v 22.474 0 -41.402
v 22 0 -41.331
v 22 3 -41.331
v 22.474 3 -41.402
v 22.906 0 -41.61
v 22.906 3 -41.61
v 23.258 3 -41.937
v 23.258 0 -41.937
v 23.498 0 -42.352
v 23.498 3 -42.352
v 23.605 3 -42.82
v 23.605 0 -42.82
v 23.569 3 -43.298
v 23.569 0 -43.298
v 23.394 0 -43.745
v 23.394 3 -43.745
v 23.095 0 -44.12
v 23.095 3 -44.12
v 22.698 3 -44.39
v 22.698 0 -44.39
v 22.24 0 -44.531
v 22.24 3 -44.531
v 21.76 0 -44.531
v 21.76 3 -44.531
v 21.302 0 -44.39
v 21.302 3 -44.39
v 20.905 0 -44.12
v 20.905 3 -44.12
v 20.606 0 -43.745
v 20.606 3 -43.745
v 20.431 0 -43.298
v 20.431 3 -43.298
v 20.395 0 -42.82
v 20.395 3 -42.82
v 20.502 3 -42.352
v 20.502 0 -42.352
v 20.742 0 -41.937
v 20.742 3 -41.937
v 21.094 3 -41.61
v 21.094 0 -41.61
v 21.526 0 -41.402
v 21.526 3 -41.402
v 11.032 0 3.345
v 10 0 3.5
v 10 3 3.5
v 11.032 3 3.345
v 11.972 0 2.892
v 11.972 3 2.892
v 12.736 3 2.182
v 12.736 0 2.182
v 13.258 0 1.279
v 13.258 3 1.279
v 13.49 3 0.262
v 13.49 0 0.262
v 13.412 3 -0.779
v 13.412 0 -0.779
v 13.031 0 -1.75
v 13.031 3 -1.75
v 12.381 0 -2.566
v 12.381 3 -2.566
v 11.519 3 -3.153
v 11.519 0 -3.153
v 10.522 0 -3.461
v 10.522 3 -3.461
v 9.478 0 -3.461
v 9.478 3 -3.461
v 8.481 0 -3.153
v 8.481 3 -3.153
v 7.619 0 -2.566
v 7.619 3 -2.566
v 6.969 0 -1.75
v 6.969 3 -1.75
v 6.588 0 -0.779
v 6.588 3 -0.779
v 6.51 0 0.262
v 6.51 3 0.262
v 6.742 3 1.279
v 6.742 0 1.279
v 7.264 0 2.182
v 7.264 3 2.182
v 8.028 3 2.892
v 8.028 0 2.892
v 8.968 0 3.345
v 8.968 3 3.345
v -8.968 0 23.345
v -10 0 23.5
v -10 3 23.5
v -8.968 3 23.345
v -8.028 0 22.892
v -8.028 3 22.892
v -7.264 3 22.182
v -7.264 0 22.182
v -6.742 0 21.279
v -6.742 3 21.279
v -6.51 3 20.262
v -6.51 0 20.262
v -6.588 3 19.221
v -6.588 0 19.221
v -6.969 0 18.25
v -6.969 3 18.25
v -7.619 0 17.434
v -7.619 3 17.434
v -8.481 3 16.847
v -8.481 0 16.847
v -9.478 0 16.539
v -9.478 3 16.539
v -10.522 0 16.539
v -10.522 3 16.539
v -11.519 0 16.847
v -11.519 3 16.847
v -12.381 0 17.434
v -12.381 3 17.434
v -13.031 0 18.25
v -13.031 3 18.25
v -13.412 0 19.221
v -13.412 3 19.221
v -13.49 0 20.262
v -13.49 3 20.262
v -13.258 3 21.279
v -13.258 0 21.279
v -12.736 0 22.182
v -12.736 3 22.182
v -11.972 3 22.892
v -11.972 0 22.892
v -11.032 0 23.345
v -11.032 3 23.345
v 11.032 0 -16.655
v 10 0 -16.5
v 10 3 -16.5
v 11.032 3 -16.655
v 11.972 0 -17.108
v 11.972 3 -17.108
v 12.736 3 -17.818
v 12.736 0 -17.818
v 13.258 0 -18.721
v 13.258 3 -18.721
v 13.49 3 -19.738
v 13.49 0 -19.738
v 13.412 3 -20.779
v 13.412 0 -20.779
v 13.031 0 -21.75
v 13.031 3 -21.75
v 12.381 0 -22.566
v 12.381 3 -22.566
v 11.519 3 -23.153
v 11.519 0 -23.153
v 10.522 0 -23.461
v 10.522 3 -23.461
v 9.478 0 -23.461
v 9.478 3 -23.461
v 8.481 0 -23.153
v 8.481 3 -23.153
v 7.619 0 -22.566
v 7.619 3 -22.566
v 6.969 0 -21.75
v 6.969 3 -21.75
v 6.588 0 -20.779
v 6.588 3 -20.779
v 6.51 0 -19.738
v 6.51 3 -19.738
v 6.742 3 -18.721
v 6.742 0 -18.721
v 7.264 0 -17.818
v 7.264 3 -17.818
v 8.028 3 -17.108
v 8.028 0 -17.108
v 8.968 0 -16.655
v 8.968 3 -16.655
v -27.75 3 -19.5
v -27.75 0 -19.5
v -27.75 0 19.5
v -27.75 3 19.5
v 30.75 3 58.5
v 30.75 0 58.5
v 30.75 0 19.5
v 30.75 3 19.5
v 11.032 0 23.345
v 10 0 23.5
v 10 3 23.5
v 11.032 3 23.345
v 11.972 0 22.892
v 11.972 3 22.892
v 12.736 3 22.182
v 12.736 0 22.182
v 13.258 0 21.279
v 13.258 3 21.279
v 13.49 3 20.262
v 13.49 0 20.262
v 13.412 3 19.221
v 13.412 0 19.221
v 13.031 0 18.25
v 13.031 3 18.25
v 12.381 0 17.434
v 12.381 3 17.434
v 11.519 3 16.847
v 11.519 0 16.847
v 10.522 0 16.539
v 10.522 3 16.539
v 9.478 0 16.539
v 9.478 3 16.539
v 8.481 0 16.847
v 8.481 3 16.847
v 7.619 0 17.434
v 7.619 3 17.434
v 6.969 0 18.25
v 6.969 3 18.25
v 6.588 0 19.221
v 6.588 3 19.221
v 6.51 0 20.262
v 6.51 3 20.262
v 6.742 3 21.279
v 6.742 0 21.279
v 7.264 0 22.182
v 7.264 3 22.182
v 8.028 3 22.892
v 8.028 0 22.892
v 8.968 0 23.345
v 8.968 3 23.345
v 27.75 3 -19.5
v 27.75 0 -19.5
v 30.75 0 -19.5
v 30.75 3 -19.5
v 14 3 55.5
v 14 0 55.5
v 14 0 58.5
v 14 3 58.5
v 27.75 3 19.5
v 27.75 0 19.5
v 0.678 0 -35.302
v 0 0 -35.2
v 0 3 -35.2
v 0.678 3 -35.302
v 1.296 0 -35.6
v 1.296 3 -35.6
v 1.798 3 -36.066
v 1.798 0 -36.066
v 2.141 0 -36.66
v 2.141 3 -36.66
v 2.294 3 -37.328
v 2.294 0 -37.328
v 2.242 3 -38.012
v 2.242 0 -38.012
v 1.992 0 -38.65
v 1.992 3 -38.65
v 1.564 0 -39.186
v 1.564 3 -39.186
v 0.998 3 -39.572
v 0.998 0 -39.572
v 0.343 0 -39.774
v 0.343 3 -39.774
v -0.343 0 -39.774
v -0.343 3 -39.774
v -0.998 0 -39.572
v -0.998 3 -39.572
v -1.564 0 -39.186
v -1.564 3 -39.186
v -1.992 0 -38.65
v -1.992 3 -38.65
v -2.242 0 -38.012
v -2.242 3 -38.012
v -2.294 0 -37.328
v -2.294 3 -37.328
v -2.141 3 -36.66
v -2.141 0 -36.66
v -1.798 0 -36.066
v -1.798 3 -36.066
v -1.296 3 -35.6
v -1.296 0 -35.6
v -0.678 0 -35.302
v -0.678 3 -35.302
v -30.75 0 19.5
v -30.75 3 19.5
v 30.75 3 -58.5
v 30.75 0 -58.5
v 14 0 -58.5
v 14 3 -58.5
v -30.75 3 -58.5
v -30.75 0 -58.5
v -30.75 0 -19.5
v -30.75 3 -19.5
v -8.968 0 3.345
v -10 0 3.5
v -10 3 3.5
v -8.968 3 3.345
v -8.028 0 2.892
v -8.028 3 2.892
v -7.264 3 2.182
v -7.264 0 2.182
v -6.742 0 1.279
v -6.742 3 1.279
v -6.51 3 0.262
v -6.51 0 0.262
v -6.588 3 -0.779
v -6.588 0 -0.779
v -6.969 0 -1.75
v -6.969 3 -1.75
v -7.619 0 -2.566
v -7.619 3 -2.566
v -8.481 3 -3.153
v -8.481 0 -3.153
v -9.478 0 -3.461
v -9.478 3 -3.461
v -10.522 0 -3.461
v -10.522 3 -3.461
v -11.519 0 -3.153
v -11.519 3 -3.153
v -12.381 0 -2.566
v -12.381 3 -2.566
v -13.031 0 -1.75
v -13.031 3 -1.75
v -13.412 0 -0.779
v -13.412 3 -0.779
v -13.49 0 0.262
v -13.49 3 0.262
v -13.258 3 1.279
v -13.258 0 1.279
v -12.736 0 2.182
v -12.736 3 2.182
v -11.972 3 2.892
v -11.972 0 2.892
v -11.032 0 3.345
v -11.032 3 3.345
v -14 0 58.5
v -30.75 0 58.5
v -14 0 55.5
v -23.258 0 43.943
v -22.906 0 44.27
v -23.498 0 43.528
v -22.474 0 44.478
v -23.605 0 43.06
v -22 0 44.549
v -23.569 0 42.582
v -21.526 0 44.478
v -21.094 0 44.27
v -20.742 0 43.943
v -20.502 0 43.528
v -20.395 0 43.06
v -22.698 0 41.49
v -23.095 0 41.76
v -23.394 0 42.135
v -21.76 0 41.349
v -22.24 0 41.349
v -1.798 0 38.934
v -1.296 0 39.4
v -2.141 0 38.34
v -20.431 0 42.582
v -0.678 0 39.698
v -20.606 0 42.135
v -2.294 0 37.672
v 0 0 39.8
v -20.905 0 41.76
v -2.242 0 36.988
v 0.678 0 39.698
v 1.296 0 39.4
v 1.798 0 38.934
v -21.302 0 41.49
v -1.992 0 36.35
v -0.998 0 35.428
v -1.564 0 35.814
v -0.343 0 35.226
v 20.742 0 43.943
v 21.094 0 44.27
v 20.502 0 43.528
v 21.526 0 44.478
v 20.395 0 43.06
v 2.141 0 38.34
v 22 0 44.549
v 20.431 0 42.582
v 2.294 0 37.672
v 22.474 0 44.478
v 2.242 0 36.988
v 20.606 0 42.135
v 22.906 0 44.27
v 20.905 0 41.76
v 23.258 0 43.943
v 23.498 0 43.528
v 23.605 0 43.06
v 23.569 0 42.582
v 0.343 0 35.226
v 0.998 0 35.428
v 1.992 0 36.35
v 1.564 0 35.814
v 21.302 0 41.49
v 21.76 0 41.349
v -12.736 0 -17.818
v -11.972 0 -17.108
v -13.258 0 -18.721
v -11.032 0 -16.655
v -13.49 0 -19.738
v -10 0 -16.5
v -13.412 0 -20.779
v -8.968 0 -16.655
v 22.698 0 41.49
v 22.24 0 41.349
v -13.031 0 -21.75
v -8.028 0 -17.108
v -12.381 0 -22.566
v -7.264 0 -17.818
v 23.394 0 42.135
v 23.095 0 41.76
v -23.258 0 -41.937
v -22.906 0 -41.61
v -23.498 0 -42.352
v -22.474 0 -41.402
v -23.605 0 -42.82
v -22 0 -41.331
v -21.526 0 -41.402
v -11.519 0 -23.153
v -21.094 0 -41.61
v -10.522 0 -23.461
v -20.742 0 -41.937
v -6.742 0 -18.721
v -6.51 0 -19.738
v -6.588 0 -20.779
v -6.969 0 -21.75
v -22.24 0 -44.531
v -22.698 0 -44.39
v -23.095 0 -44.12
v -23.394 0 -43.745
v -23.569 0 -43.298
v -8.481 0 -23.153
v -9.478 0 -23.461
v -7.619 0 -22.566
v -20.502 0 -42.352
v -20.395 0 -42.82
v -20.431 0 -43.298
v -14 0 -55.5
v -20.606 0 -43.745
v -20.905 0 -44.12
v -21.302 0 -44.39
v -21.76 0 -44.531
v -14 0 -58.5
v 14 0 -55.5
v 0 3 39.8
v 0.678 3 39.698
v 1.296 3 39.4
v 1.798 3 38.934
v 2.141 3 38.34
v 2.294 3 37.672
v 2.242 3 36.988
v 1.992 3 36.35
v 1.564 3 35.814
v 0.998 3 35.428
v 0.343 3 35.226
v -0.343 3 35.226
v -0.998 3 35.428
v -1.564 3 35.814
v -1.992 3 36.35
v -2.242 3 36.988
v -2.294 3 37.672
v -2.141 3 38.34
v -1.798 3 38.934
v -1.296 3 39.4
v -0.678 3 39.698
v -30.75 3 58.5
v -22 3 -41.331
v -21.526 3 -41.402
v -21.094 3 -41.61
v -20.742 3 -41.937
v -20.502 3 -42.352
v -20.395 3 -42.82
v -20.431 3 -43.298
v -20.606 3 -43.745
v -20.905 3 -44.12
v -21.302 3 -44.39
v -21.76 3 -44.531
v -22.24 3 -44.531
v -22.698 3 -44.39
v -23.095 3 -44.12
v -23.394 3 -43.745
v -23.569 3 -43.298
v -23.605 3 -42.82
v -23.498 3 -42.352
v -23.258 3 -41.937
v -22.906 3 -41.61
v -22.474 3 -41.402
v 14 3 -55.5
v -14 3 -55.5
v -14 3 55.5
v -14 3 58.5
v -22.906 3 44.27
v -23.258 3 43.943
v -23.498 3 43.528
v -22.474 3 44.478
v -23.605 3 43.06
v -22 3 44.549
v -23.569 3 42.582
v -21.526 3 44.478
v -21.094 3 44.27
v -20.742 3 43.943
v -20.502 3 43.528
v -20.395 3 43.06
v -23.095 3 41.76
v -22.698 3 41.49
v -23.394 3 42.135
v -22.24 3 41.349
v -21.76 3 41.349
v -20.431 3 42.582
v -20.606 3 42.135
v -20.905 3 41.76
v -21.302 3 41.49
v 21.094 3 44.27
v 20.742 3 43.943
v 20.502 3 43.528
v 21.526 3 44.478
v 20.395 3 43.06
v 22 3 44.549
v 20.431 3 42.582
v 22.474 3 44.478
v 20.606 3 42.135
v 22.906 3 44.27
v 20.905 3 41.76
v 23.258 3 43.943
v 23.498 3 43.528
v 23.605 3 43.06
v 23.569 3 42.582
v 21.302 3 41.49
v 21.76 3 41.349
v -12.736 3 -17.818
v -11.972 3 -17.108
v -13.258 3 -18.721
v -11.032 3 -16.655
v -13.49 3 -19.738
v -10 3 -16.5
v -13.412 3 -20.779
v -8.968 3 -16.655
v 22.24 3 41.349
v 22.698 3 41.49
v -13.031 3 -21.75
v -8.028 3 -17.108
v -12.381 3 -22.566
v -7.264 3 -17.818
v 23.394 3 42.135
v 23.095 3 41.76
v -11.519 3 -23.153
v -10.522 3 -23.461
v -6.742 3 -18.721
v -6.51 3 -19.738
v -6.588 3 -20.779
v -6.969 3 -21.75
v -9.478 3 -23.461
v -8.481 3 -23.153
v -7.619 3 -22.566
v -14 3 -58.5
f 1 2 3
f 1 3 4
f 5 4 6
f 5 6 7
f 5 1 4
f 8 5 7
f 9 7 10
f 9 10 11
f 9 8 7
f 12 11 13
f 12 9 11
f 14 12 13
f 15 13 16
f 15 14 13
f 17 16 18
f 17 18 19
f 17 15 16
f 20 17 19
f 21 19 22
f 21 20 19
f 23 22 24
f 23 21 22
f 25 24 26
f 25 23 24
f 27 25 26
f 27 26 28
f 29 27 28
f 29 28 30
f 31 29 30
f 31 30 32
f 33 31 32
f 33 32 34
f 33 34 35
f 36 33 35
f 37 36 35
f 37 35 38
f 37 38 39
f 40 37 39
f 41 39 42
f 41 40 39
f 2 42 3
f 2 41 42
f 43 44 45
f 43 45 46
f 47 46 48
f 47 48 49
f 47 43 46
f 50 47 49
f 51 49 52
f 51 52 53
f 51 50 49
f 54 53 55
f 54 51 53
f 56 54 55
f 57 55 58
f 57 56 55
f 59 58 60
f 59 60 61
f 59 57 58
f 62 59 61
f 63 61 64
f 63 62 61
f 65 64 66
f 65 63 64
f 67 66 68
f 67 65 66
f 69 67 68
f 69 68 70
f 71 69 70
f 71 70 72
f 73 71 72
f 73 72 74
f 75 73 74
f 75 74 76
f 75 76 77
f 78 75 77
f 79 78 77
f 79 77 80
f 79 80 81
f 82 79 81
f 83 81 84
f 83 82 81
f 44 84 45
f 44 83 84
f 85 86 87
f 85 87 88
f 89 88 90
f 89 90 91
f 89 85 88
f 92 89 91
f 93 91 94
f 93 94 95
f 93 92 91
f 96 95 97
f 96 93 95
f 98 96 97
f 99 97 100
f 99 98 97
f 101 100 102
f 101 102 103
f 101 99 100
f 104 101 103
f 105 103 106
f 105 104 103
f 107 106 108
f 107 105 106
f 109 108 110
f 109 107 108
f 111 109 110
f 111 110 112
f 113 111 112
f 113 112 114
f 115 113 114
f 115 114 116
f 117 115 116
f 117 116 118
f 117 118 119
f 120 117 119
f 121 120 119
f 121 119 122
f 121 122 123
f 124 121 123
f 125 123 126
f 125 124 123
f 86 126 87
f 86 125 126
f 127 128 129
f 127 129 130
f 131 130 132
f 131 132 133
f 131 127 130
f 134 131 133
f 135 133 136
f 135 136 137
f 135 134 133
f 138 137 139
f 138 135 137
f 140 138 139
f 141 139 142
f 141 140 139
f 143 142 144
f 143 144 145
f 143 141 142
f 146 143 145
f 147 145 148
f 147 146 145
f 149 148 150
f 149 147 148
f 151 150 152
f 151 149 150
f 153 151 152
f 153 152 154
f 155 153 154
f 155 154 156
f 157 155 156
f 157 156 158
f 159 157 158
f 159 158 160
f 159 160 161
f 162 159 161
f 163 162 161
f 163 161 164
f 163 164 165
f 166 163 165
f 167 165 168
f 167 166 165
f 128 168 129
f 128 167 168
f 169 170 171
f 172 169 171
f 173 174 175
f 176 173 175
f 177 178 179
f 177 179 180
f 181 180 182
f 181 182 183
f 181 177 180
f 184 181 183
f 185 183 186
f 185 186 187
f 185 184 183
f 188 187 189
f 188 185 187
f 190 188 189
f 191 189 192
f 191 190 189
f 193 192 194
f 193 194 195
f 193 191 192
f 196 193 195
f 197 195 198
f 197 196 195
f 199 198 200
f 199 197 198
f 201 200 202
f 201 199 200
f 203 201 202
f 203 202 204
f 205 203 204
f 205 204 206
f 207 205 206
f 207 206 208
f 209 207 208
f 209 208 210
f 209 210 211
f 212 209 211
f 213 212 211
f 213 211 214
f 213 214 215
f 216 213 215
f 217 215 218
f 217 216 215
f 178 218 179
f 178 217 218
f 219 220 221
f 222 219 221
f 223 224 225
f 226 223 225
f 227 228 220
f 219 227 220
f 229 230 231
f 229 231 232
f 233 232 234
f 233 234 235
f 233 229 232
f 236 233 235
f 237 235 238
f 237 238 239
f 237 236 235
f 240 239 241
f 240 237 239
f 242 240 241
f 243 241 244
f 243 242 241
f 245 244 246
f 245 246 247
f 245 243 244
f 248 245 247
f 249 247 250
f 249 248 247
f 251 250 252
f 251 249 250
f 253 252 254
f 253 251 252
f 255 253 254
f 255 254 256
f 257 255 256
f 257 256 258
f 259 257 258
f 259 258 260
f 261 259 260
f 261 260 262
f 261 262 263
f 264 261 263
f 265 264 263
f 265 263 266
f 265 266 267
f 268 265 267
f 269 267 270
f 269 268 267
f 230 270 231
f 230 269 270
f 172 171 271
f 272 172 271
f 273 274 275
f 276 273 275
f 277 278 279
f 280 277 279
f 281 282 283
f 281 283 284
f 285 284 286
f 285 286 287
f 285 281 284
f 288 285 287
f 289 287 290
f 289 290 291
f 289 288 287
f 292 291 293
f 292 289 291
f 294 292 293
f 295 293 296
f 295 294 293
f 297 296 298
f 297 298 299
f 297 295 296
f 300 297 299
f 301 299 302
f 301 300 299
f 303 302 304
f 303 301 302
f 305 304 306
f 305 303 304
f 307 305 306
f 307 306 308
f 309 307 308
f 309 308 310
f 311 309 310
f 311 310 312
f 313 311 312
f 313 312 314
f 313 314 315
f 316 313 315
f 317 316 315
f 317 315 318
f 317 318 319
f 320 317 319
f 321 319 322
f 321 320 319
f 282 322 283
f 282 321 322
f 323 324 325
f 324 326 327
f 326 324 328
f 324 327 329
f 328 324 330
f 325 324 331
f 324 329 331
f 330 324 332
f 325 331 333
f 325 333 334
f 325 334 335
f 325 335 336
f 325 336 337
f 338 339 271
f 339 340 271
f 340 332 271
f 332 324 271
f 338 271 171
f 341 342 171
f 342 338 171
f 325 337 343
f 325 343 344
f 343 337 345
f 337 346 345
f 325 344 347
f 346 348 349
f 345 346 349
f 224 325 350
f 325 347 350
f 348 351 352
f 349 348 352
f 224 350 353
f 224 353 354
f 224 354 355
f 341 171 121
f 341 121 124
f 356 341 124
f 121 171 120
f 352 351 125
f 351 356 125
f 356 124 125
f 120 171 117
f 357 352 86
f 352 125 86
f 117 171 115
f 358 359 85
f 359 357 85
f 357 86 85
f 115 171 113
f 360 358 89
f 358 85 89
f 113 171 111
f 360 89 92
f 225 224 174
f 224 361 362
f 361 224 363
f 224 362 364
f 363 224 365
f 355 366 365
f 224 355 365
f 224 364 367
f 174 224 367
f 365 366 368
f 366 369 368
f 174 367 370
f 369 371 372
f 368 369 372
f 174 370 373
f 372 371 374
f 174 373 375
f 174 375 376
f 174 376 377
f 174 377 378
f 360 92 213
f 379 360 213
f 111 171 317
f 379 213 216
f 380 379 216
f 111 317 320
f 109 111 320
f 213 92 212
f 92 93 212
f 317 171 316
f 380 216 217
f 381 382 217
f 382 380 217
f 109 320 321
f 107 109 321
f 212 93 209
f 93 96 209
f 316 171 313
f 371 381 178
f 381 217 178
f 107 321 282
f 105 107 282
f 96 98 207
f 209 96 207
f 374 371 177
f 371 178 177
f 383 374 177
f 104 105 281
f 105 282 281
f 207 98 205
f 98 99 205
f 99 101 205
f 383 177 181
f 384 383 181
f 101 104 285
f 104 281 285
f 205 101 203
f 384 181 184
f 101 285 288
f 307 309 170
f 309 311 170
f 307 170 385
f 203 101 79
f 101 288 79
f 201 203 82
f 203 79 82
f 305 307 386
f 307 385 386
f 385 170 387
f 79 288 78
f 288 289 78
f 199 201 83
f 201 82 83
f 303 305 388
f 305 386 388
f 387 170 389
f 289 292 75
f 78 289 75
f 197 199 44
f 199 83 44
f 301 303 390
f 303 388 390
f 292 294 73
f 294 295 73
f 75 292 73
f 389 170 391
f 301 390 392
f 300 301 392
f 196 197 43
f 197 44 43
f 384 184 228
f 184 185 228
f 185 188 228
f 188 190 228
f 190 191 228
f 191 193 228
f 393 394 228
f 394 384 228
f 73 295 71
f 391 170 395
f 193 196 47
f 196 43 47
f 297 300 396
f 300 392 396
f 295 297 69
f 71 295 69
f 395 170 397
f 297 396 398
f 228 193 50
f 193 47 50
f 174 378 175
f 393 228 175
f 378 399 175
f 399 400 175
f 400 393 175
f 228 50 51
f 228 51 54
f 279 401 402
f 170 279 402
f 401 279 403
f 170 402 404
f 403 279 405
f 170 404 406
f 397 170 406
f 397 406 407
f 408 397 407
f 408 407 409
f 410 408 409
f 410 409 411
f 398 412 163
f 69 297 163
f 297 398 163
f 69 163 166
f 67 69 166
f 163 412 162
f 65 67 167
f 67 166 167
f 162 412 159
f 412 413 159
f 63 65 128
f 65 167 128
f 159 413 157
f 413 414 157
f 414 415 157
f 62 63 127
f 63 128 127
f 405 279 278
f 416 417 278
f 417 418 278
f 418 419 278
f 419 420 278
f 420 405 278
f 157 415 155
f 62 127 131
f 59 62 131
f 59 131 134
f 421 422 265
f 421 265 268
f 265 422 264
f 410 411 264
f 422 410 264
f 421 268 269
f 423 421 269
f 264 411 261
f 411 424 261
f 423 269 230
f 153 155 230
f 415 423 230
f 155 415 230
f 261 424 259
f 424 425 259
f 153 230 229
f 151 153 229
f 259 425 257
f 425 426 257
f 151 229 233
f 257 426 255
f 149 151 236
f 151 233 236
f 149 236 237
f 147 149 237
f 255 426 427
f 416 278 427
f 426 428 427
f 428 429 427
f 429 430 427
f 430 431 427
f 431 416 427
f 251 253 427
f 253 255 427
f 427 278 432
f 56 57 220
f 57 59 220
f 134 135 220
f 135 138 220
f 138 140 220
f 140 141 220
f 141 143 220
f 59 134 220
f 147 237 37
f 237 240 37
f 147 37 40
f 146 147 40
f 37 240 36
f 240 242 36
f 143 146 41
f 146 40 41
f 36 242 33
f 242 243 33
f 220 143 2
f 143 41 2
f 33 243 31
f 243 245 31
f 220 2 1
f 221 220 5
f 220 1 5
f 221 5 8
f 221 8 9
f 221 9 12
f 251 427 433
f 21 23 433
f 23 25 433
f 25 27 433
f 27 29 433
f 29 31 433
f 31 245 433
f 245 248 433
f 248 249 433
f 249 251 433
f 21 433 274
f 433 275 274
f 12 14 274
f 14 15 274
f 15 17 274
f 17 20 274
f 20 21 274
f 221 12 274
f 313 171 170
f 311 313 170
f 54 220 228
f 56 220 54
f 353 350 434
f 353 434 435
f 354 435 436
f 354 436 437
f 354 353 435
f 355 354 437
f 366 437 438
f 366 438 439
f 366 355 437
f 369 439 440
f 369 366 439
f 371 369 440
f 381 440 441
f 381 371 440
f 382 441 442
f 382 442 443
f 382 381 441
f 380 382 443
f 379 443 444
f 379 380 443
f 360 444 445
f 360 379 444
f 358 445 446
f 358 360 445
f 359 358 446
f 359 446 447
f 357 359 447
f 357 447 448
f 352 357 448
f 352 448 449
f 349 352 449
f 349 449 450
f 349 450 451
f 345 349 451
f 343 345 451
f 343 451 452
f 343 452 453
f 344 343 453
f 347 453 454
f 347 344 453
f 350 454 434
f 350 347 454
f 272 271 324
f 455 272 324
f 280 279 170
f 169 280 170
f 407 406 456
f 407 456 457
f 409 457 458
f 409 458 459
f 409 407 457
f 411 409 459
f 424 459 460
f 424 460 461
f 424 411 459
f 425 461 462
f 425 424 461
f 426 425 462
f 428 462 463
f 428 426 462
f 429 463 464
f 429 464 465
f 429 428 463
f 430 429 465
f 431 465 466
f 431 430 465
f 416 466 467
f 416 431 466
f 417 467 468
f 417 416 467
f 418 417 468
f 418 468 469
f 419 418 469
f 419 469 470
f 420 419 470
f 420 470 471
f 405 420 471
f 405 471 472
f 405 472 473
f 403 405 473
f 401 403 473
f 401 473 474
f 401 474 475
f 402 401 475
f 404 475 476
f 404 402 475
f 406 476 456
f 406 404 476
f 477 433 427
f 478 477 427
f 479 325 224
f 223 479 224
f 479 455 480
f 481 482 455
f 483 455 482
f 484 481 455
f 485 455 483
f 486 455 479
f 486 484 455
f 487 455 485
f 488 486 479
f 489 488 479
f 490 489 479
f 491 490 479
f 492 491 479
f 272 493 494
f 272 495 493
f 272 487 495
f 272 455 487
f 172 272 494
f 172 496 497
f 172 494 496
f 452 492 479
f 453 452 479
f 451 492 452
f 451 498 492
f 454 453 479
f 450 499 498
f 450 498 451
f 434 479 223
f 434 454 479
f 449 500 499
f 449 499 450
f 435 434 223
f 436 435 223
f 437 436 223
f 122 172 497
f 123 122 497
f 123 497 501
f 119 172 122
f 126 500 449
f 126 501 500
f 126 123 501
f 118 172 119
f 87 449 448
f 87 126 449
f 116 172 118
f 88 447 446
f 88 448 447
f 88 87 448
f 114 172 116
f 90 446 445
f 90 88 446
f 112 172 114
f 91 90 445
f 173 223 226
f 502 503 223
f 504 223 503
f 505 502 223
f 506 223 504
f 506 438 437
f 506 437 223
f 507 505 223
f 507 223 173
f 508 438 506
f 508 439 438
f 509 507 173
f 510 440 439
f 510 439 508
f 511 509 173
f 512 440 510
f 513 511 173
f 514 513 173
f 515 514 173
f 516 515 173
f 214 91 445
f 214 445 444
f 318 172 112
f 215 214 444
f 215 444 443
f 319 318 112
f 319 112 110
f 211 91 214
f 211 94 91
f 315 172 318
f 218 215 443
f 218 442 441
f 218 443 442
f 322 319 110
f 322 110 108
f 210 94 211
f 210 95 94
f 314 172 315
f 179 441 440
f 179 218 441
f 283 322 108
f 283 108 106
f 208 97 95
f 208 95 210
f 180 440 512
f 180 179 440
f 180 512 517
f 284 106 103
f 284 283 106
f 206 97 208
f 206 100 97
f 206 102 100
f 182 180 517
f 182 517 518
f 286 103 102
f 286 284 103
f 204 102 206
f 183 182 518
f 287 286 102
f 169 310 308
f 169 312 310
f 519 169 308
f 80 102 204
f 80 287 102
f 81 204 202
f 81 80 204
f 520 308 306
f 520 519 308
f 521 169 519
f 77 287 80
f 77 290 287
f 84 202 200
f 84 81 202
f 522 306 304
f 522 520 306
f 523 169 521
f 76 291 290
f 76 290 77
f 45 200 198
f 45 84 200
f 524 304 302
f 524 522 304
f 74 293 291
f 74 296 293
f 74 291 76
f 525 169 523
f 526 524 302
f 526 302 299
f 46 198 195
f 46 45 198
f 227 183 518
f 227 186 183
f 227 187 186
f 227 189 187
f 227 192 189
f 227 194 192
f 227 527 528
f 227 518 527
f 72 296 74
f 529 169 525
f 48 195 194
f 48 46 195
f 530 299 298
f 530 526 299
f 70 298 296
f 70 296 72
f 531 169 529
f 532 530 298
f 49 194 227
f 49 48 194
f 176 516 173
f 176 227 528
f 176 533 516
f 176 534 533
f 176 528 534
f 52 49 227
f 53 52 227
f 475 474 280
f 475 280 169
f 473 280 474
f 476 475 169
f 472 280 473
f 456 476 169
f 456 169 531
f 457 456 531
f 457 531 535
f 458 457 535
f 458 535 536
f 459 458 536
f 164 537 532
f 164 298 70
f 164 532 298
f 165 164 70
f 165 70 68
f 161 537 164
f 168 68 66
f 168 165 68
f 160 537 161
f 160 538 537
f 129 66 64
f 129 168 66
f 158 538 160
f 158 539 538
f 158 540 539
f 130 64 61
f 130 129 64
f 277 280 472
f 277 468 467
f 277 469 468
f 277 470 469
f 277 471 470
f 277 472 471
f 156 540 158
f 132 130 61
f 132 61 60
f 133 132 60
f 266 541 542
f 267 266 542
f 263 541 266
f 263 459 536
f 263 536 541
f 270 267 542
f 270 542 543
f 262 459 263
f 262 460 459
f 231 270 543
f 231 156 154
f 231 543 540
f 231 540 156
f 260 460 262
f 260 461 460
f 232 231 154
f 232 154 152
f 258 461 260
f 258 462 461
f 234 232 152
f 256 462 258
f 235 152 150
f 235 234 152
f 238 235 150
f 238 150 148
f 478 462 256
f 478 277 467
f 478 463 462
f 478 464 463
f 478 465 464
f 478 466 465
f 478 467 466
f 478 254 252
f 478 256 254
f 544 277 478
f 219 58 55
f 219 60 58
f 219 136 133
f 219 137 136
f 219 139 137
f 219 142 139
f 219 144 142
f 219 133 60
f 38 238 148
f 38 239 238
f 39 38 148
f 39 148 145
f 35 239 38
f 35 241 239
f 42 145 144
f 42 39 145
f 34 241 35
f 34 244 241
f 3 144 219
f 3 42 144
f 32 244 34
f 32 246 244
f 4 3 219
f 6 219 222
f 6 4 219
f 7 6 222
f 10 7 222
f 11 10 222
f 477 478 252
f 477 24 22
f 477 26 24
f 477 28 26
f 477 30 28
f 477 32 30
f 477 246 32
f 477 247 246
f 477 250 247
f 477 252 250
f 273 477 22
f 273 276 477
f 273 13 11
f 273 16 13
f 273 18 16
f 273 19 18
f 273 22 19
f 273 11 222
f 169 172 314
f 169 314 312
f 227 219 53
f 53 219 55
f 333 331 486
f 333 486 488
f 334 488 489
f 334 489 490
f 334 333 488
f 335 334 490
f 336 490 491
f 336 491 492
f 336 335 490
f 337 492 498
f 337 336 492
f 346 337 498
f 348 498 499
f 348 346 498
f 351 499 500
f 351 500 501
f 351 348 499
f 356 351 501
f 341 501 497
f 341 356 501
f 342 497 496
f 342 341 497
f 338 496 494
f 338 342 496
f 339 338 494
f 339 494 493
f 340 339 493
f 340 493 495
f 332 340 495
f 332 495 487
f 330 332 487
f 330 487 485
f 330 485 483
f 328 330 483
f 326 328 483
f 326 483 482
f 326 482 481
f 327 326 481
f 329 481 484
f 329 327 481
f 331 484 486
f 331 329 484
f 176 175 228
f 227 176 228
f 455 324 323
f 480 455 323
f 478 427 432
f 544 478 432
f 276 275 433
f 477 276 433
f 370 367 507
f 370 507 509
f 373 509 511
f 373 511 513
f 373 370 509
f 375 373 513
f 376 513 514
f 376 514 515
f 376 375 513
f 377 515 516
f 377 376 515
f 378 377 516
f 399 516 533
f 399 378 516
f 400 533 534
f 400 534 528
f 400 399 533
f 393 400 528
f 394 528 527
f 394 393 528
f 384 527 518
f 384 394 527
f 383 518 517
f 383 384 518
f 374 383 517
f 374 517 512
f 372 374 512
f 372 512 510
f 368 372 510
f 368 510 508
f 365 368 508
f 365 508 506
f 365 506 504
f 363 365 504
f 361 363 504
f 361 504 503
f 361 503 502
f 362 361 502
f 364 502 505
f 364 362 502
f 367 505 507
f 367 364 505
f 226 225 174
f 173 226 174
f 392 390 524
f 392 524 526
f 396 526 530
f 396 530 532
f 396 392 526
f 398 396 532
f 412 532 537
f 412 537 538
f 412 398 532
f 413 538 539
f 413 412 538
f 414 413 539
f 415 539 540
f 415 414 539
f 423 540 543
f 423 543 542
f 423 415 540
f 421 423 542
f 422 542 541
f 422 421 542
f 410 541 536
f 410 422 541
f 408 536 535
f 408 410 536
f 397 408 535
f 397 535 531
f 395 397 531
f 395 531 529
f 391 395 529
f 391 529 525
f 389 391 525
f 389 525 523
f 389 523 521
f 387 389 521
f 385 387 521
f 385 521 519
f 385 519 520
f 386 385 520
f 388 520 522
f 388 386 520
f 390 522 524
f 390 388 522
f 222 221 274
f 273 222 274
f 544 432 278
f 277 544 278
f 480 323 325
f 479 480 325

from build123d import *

# Parameters (mm, degrees)
SKETCH1_R           = 1.609204822
SKETCH1_R_2         = 2.3
SKETCH1_R_3         = 3.5
BOSS_EXTRUDE1_DEPTH = 3


with BuildPart() as part:
    # Sketch1 → Boss-Extrude1 (new body)
    with BuildSketch(Plane(origin=(0, 0, 0), x_dir=(1, 0, 0), z_dir=(0, 1, 0))):
        Polygon((-30.75, 58.5), (-30.75, 19.5), (-27.75, 19.5), (-27.75, -19.5), (-30.75, -19.5), (-30.75, -58.5), (-14, -58.5), (-14, -55.5), (14, -55.5), (14, -58.5), (30.75, -58.5), (30.75, -19.5), (27.75, -19.5), (27.75, 19.5), (30.75, 19.5), (30.75, 58.5), (14, 58.5), (14, 55.5), (-14, 55.5), (-14, 58.5), align=None)
        with Locations(Location((-22, -42.94, 0), (0, 0, 270))):
            Circle(SKETCH1_R, mode=Mode.SUBTRACT)
        with Locations(Location((22, -42.94, 0), (0, 0, 270))):
            Circle(SKETCH1_R, mode=Mode.SUBTRACT)
        with Locations(Location((22, 42.94, 0), (0, 0, 270))):
            Circle(SKETCH1_R, mode=Mode.SUBTRACT)
        with Locations(Location((-22, 42.94, 0), (0, 0, 270))):
            Circle(SKETCH1_R, mode=Mode.SUBTRACT)
        with Locations(Location((0, 37.5, 0), (0, 0, 270))):
            Circle(SKETCH1_R_2, mode=Mode.SUBTRACT)
        with Locations(Location((0, -37.5, 0), (0, 0, 270))):
            Circle(SKETCH1_R_2, mode=Mode.SUBTRACT)
        with Locations(Location((-10, -20, 0), (0, 0, 270))):
            Circle(SKETCH1_R_3, mode=Mode.SUBTRACT)
        with Locations(Location((10, -20, 0), (0, 0, 270))):
            Circle(SKETCH1_R_3, mode=Mode.SUBTRACT)
        with Locations(Location((-10, 0, 0), (0, 0, 270))):
            Circle(SKETCH1_R_3, mode=Mode.SUBTRACT)
        with Locations(Location((10, 0, 0), (0, 0, 270))):
            Circle(SKETCH1_R_3, mode=Mode.SUBTRACT)
        with Locations(Location((-10, 20, 0), (0, 0, 270))):
            Circle(SKETCH1_R_3, mode=Mode.SUBTRACT)
        with Locations(Location((10, 20, 0), (0, 0, 270))):
            Circle(SKETCH1_R_3, mode=Mode.SUBTRACT)
    extrude(amount=BOSS_EXTRUDE1_DEPTH)


solid = part.part
